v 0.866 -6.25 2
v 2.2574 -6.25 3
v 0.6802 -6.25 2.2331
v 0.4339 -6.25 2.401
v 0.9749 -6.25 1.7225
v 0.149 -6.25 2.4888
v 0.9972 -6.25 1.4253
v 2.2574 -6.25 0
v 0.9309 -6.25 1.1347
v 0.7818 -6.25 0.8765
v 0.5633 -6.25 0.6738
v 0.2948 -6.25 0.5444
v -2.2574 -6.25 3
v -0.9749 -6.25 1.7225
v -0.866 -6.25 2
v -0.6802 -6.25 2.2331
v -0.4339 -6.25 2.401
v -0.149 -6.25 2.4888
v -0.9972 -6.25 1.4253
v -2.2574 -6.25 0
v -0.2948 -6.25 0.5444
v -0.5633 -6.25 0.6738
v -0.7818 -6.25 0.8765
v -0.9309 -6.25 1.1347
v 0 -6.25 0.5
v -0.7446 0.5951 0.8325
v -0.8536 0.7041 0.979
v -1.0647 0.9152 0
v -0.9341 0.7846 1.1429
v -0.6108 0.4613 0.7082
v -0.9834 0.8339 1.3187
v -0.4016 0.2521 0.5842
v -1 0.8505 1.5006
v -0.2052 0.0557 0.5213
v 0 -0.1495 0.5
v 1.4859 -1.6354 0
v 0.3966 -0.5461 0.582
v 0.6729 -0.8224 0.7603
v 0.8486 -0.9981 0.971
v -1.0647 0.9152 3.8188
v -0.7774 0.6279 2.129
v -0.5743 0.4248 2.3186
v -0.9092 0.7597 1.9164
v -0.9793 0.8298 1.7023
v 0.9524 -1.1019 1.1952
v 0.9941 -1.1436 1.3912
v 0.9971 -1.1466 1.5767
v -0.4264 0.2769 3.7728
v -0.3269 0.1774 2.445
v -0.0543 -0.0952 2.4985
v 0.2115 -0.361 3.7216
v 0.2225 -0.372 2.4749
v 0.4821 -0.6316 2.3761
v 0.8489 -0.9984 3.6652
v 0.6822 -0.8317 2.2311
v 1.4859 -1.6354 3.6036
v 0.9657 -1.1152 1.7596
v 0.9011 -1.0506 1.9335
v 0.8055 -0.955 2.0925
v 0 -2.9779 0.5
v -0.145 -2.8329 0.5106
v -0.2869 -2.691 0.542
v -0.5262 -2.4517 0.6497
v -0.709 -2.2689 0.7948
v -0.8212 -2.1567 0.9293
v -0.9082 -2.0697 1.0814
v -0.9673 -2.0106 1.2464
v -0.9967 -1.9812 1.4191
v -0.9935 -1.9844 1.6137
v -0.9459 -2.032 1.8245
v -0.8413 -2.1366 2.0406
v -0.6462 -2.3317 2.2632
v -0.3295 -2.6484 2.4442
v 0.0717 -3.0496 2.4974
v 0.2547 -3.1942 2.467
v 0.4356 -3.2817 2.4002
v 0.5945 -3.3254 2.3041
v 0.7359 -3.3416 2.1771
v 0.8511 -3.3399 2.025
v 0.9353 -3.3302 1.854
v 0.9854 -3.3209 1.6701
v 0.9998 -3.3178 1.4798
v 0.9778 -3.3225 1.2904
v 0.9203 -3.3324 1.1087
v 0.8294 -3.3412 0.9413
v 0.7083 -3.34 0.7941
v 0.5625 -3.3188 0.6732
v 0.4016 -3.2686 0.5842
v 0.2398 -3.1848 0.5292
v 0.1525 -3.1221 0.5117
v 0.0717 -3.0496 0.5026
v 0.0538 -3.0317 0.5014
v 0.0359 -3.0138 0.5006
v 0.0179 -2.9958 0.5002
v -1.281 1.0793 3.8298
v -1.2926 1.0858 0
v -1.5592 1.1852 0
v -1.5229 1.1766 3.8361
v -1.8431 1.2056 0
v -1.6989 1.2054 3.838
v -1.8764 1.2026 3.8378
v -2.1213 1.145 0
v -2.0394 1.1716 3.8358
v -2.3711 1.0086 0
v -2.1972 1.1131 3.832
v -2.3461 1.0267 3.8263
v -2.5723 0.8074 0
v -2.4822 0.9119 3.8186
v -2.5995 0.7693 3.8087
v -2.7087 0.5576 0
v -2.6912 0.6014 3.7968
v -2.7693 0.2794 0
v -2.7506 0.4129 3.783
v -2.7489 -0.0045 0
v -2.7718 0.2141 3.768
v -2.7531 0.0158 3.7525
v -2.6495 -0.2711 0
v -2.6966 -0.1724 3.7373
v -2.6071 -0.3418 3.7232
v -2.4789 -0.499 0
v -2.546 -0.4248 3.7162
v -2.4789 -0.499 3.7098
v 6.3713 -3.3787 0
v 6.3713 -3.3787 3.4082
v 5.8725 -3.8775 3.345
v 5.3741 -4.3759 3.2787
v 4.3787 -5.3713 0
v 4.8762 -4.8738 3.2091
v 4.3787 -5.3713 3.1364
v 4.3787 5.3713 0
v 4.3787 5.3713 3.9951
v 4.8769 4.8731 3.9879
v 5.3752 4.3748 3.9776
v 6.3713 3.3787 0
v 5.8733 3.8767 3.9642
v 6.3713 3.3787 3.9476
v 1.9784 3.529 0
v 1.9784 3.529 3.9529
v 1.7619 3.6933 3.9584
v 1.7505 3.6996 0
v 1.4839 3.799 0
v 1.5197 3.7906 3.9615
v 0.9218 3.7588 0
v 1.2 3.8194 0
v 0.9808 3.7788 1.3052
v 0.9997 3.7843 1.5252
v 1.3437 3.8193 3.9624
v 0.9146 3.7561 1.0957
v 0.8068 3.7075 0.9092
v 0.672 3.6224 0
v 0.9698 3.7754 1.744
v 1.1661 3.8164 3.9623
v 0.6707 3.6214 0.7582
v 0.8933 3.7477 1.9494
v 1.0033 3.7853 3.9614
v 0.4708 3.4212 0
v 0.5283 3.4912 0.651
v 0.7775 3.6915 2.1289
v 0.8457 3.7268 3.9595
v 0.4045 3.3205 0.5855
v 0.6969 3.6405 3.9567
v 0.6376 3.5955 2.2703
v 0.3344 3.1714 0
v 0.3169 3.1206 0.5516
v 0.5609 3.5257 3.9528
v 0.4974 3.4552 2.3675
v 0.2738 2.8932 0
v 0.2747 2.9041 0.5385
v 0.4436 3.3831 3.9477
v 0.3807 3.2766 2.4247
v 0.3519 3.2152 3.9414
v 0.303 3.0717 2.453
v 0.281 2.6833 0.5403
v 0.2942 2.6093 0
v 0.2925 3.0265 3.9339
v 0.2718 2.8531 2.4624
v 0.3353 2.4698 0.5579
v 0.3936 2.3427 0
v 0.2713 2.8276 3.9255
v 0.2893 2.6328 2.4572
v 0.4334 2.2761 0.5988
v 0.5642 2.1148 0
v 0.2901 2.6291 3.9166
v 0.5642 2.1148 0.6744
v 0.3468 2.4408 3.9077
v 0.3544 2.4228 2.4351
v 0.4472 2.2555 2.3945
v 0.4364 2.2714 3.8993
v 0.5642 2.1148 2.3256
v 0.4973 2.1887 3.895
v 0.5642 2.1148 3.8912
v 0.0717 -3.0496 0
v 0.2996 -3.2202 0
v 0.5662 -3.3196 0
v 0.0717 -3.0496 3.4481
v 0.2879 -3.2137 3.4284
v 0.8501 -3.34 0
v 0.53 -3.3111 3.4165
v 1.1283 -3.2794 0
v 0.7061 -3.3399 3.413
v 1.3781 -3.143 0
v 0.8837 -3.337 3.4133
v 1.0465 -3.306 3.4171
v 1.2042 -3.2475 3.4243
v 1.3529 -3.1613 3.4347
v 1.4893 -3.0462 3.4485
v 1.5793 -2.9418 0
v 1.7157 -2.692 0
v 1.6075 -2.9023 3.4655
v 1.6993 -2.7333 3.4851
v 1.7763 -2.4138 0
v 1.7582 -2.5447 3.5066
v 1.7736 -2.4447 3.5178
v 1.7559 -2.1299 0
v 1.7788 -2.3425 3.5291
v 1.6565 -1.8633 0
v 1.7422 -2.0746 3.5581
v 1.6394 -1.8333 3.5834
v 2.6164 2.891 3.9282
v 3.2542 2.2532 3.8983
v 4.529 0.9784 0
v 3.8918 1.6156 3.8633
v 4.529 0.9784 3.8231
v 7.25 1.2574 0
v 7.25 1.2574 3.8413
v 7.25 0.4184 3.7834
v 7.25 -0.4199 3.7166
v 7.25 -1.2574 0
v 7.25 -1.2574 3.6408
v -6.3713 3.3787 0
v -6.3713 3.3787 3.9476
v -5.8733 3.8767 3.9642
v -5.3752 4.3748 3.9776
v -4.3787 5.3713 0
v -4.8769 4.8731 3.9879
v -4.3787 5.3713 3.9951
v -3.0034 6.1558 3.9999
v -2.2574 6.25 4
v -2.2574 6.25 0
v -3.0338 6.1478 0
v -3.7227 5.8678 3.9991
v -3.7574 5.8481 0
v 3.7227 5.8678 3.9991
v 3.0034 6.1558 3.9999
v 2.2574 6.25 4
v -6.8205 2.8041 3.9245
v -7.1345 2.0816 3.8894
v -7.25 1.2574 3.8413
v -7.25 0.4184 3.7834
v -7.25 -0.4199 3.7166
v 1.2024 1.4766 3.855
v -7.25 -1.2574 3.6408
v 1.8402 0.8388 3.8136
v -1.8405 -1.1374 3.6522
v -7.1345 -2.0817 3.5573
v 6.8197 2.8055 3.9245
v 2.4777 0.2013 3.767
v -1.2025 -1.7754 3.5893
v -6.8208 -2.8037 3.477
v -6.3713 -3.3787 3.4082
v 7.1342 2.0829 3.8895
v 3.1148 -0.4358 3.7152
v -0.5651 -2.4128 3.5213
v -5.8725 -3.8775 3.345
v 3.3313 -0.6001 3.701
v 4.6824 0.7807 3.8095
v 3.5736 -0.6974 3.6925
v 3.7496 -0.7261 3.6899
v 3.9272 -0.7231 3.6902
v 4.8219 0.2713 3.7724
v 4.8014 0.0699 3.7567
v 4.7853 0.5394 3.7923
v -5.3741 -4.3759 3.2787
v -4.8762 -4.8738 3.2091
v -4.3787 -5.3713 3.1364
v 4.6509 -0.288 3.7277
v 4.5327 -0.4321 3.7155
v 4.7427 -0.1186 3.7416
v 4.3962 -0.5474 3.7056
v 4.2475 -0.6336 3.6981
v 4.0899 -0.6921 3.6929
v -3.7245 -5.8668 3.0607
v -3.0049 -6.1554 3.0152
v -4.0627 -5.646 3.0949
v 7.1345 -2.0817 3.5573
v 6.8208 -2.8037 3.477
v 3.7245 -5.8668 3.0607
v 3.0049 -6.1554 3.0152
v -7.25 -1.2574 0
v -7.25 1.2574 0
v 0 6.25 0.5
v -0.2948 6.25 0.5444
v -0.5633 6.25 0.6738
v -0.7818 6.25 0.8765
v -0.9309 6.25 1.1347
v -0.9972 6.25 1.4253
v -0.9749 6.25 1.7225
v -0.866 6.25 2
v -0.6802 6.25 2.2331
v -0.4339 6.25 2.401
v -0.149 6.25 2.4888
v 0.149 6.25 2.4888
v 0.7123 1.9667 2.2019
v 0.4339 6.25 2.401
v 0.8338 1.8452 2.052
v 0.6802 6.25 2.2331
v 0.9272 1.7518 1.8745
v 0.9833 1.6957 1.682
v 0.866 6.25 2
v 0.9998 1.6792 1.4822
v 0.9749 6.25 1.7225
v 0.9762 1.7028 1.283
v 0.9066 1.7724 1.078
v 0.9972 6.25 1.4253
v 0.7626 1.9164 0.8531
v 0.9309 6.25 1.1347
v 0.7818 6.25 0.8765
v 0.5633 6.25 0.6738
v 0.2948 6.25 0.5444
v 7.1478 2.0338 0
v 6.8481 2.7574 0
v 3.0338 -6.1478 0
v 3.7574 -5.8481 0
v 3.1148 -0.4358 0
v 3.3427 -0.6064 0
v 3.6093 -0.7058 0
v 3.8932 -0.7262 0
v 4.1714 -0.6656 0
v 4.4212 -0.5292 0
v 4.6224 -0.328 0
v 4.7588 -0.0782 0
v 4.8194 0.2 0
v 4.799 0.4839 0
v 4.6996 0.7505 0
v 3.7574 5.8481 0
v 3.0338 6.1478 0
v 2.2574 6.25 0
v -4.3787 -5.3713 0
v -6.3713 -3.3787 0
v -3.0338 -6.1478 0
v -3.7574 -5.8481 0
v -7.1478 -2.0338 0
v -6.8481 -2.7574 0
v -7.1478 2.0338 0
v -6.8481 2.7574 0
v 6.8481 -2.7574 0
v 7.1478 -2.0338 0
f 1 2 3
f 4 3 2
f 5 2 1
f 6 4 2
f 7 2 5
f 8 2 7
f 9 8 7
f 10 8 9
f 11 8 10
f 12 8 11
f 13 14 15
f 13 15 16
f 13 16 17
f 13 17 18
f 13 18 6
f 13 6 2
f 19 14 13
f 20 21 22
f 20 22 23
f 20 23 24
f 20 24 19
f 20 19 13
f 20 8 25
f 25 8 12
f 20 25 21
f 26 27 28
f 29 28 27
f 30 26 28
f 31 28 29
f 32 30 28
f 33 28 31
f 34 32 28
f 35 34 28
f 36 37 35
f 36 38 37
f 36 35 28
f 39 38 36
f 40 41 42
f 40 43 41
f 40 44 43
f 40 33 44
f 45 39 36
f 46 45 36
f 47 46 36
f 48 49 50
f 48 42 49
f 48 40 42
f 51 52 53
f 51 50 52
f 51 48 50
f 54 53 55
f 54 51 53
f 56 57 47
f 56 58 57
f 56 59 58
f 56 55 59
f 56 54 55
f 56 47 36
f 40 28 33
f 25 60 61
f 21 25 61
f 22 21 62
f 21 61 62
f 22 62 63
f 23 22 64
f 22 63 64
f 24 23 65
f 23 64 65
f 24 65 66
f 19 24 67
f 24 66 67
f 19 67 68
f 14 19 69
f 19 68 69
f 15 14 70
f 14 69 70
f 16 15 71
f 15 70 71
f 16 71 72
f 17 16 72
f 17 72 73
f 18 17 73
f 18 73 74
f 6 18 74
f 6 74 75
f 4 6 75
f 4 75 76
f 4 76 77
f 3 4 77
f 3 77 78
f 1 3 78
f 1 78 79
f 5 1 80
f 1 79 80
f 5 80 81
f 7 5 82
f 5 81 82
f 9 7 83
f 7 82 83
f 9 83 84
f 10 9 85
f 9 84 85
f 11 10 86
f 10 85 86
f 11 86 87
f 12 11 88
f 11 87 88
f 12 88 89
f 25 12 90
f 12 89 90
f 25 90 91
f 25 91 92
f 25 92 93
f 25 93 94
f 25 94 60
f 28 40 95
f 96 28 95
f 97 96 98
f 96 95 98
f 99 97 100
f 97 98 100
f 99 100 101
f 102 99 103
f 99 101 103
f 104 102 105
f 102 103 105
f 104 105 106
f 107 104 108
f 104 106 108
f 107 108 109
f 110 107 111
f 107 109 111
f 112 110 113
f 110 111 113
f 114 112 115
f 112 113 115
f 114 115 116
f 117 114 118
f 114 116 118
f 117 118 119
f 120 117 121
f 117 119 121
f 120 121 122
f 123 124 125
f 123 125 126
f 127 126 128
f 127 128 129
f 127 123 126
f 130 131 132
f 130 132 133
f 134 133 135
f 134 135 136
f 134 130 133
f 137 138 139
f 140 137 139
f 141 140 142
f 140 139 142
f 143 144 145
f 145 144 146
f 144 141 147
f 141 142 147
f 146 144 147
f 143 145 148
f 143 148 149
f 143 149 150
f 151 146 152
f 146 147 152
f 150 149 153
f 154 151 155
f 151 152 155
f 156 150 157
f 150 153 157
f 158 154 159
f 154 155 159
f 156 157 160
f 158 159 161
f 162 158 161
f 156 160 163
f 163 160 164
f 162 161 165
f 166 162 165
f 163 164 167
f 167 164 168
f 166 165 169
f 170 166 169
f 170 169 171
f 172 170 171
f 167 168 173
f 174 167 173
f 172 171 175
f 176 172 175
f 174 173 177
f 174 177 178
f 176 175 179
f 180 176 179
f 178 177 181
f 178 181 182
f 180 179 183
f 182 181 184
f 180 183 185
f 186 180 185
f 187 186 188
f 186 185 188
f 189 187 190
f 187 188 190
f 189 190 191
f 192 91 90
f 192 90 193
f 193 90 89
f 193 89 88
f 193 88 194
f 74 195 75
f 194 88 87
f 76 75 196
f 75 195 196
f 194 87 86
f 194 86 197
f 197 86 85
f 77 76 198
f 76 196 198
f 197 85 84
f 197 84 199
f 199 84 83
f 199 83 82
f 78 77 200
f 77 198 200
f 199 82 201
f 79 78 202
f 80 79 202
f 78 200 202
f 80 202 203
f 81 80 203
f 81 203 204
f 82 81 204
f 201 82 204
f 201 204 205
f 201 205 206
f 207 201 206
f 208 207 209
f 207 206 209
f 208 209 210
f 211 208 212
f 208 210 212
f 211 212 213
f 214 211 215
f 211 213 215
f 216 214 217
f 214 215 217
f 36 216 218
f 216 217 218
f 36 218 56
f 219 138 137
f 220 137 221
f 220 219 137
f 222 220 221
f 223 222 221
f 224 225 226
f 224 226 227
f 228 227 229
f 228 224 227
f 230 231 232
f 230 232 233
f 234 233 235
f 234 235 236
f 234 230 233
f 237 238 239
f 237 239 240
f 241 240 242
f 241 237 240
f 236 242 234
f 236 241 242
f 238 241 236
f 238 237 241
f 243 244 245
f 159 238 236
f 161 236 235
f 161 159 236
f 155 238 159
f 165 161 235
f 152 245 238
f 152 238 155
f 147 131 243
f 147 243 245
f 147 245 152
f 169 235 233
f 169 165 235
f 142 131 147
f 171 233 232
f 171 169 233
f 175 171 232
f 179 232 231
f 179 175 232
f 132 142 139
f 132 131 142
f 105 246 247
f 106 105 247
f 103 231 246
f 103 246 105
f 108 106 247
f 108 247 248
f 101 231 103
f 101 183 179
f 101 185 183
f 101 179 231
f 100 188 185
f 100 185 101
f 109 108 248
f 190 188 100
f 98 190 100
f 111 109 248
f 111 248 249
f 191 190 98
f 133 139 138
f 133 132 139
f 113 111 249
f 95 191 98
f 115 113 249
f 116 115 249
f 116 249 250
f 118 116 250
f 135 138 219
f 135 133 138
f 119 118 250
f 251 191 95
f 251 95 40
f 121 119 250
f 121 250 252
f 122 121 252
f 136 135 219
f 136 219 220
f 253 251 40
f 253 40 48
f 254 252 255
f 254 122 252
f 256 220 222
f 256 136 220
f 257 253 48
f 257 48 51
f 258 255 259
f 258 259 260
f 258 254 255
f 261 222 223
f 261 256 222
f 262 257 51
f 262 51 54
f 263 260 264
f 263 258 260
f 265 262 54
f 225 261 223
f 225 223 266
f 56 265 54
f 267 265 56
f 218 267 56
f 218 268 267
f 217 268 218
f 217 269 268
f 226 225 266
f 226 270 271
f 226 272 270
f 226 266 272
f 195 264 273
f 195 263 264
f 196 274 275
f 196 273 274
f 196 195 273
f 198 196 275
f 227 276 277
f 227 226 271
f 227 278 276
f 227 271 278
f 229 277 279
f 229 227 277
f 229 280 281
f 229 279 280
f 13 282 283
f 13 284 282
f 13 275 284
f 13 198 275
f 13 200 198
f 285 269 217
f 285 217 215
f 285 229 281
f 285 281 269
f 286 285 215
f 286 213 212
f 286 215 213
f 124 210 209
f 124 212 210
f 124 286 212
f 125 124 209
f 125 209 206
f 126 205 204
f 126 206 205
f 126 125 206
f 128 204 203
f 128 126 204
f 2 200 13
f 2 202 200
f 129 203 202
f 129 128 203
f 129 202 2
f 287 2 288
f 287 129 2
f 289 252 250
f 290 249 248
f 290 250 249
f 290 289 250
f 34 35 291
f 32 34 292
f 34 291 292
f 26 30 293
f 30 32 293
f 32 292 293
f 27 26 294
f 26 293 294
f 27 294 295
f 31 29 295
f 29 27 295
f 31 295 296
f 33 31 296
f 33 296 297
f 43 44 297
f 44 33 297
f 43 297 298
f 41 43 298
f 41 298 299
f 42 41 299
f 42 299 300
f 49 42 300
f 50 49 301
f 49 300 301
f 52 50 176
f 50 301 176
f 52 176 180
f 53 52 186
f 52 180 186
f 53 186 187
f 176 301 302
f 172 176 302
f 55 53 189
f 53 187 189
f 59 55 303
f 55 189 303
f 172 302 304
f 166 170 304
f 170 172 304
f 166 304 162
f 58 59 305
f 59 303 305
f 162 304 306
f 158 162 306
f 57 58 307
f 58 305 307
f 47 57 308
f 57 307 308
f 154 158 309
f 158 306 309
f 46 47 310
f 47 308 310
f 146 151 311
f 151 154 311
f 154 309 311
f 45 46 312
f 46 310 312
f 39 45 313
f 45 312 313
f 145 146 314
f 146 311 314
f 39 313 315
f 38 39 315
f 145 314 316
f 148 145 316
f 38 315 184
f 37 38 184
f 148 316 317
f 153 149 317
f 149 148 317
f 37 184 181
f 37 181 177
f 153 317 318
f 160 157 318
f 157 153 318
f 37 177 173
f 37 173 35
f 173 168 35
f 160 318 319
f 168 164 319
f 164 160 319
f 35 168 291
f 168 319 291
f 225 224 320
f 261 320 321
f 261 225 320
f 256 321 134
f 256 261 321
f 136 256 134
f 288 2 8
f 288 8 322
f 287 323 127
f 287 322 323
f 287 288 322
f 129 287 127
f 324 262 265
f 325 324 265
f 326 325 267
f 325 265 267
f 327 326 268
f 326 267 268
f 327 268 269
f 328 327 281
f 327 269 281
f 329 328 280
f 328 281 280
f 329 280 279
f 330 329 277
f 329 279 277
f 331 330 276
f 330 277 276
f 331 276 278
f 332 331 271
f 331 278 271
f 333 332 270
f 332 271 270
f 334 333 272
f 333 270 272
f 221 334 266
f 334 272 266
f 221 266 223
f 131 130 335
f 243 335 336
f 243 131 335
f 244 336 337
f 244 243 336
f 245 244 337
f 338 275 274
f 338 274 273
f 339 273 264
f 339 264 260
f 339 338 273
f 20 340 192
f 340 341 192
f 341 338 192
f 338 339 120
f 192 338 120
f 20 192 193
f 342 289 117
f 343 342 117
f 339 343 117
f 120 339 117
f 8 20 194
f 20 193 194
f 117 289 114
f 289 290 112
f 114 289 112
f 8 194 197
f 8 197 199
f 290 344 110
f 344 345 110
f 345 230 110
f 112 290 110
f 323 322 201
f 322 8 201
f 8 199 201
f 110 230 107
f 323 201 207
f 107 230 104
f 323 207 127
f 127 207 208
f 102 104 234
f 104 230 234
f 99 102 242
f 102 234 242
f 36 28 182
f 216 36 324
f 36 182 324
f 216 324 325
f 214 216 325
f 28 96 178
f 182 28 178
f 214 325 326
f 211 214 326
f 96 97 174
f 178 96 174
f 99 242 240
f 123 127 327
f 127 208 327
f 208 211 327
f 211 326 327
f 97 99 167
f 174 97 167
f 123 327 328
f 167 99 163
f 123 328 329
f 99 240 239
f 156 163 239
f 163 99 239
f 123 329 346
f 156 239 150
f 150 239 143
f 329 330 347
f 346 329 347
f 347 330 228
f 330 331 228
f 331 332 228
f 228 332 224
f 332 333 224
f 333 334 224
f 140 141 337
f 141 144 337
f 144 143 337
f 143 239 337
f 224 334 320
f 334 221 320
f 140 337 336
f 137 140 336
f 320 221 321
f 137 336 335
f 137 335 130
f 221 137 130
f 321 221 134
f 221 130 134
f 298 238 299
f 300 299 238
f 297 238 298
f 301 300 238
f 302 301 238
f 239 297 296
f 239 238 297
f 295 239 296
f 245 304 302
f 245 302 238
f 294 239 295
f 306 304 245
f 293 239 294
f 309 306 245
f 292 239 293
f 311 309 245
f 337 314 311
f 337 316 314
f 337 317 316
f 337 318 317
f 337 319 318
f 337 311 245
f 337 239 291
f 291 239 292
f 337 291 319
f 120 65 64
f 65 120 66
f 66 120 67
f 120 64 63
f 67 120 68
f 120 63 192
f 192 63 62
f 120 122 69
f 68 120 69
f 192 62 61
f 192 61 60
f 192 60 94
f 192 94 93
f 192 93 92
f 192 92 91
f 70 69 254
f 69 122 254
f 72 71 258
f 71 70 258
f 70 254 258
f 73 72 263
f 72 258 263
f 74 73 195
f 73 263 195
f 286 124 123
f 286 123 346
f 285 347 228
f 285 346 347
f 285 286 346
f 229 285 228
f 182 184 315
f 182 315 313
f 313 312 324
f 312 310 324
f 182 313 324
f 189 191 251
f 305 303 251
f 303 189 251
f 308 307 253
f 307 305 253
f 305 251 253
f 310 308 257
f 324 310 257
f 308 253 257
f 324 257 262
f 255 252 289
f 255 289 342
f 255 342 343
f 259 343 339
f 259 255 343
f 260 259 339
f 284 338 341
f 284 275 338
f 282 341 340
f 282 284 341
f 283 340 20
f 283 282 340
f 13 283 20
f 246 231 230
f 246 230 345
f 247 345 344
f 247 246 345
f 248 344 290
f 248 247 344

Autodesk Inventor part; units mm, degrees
ref_plane "YZ Plane" through (0, 0, 0) normal (1, 0, 0) x (0, 1, 0)
ref_plane "XZ Plane" through (0, 0, 0) normal (0, 1, 0) x (-1, 0, 0)
ref_plane "XY Plane" through (0, 0, 0) normal (0, 0, 1) x (1, 0, 0)
sketch "Base" plane through (0, 0, 0) normal (0, 0, 1) x (1, 0, 0)
  line L0 (-7.25, -2.5) -> (-7.25, 2.5)
  line L1 (-7.25, 2.5) -> (-3.5, 6.25)
  line L2 (-3.5, 6.25) -> (3.5, 6.25)
  line L3 (3.5, 6.25) -> (7.25, 2.5)
  line L4 (7.25, 2.5) -> (7.25, -2.5)
  line L5 (7.25, -2.5) -> (3.5, -6.25)
  line L6 (3.5, -6.25) -> (-3.5, -6.25)
  line L7 (-3.5, -6.25) -> (-7.25, -2.5)
  line L8 (-7.25, 0) -> (7.25, 0) construction
  line L9 (0, 6.25) -> (0, -6.25) construction
  point P0 (0, 0)
  point P1 (0, 0)
  dimension "d1" = 14.5
  dimension "d5" = 12.5
  dimension "d7" = 5
extrude "BaseFeature" add sketch "Base" along normal blind 4
fillet "BaseFilletsFeature" radius 3 8 edges at (-7.25, -2.5, 2) (-3.5, -6.25, 2) (3.5, -6.25, 2) (7.25, -2.5, 2) (7.25, 2.5, 2) (3.5, 6.25, 2) (-3.5, 6.25, 2) (-7.25, 2.5, 2)
sketch "RailHoles" plane through (0, 0, 4) normal (0, 0, 1) x (1, 0, 0)
  line L0 (1.2713, 2.8219) -> (3.8219, 0.2713) construction
  line L1 (-1.7718, 0.2081) -> (0.7788, -2.3425) construction
  line L2 (6.3713, 3.3787) -> (4.3787, 5.3713) construction
  line L3 (5.375, 4.375) -> (2.5466, 1.5466) construction
  circle A0 centre (1.2713, 2.8219) radius 1
  circle A1 centre (3.8219, 0.2713) radius 1
  circle A2 centre (-1.7718, 0.2081) radius 1
  circle A3 centre (0.7788, -2.3425) radius 1
  line L4 (1.9784, 3.529) -> (4.529, 0.9784)
  line L5 (0.5642, 2.1148) -> (3.1148, -0.4358)
  line L6 (-1.0647, 0.9152) -> (1.4859, -1.6354)
  line L7 (-2.4789, -0.499) -> (0.0717, -3.0496)
  dimension "d11" = 4
  dimension "d12" = 4
  dimension "d13" = 3.6071
  dimension "d14" = 2
  dimension "d15" = 1.5
  dimension "d25" = 2.818
extrude "RailHolesFeature" cut sketch "RailHoles" against normal through all
sketch "RouteHole" plane through (-2.2574, -6.25, 0) normal (0, -1, 0) x (1, 0, 0)
  line L0 (4.5147, 4) -> (4.5147, 0) construction
  line L1 (0, 4) -> (4.5147, 4) construction
  line L2 (0, 0) -> (0, 4) construction
  line L3 (4.5147, 0) -> (0, 0) construction
  line L4 (0, 4) -> (0, 0) construction
  line L5 (0, 4) -> (4.5147, 4) construction
  line L6 (2.2574, 4) -> (2.2574, 0) construction
  line L7 (4.5147, 0) -> (0, 0) construction
  circle A0 centre (2.2574, 1.5) radius 1.25
  dimension "d40" = 2.5
  dimension "d41" = 1.5
hole "RouteHoleFeature" at (0, -6.25, 1.5) direction (0, 1, 0) diameter 2 end through all
sketch "SideProfile" plane through (7.25, -1.2574, 0) normal (1, 0, 0) x (0, 0, -1)
  arc A0 (-4, 7.5074) -> (-3, -4.9926) centre (74.625, 7.5074) ccw
  line L0 (-4, -4.9926) -> (0, -4.9926) construction
  line L1 (0, 7.5074) -> (-4, 7.5074) construction
  line L2 (-3, -4.9926) -> (0, -4.9926)
  line L3 (0, 7.5074) -> (0, -4.9926)
  line L4 (0, 7.5074) -> (0, 6.6287) projected
  line L5 (0, 7.5074) -> (-4, 7.5074)
  line L6 (-4, -2.1213) -> (-4, 0) construction
  dimension "d36" = 4
  dimension "d39" = 3
extrude "SideProfileFeature" cut sketch "SideProfile" against normal through all keep common part
equation "\"d7\" = 0.4 * d5"
equation "\"d12\" = 2 * d14"
equation "\"d13\" = 1.28 * d25"
properties part number "PinkyRouter"
